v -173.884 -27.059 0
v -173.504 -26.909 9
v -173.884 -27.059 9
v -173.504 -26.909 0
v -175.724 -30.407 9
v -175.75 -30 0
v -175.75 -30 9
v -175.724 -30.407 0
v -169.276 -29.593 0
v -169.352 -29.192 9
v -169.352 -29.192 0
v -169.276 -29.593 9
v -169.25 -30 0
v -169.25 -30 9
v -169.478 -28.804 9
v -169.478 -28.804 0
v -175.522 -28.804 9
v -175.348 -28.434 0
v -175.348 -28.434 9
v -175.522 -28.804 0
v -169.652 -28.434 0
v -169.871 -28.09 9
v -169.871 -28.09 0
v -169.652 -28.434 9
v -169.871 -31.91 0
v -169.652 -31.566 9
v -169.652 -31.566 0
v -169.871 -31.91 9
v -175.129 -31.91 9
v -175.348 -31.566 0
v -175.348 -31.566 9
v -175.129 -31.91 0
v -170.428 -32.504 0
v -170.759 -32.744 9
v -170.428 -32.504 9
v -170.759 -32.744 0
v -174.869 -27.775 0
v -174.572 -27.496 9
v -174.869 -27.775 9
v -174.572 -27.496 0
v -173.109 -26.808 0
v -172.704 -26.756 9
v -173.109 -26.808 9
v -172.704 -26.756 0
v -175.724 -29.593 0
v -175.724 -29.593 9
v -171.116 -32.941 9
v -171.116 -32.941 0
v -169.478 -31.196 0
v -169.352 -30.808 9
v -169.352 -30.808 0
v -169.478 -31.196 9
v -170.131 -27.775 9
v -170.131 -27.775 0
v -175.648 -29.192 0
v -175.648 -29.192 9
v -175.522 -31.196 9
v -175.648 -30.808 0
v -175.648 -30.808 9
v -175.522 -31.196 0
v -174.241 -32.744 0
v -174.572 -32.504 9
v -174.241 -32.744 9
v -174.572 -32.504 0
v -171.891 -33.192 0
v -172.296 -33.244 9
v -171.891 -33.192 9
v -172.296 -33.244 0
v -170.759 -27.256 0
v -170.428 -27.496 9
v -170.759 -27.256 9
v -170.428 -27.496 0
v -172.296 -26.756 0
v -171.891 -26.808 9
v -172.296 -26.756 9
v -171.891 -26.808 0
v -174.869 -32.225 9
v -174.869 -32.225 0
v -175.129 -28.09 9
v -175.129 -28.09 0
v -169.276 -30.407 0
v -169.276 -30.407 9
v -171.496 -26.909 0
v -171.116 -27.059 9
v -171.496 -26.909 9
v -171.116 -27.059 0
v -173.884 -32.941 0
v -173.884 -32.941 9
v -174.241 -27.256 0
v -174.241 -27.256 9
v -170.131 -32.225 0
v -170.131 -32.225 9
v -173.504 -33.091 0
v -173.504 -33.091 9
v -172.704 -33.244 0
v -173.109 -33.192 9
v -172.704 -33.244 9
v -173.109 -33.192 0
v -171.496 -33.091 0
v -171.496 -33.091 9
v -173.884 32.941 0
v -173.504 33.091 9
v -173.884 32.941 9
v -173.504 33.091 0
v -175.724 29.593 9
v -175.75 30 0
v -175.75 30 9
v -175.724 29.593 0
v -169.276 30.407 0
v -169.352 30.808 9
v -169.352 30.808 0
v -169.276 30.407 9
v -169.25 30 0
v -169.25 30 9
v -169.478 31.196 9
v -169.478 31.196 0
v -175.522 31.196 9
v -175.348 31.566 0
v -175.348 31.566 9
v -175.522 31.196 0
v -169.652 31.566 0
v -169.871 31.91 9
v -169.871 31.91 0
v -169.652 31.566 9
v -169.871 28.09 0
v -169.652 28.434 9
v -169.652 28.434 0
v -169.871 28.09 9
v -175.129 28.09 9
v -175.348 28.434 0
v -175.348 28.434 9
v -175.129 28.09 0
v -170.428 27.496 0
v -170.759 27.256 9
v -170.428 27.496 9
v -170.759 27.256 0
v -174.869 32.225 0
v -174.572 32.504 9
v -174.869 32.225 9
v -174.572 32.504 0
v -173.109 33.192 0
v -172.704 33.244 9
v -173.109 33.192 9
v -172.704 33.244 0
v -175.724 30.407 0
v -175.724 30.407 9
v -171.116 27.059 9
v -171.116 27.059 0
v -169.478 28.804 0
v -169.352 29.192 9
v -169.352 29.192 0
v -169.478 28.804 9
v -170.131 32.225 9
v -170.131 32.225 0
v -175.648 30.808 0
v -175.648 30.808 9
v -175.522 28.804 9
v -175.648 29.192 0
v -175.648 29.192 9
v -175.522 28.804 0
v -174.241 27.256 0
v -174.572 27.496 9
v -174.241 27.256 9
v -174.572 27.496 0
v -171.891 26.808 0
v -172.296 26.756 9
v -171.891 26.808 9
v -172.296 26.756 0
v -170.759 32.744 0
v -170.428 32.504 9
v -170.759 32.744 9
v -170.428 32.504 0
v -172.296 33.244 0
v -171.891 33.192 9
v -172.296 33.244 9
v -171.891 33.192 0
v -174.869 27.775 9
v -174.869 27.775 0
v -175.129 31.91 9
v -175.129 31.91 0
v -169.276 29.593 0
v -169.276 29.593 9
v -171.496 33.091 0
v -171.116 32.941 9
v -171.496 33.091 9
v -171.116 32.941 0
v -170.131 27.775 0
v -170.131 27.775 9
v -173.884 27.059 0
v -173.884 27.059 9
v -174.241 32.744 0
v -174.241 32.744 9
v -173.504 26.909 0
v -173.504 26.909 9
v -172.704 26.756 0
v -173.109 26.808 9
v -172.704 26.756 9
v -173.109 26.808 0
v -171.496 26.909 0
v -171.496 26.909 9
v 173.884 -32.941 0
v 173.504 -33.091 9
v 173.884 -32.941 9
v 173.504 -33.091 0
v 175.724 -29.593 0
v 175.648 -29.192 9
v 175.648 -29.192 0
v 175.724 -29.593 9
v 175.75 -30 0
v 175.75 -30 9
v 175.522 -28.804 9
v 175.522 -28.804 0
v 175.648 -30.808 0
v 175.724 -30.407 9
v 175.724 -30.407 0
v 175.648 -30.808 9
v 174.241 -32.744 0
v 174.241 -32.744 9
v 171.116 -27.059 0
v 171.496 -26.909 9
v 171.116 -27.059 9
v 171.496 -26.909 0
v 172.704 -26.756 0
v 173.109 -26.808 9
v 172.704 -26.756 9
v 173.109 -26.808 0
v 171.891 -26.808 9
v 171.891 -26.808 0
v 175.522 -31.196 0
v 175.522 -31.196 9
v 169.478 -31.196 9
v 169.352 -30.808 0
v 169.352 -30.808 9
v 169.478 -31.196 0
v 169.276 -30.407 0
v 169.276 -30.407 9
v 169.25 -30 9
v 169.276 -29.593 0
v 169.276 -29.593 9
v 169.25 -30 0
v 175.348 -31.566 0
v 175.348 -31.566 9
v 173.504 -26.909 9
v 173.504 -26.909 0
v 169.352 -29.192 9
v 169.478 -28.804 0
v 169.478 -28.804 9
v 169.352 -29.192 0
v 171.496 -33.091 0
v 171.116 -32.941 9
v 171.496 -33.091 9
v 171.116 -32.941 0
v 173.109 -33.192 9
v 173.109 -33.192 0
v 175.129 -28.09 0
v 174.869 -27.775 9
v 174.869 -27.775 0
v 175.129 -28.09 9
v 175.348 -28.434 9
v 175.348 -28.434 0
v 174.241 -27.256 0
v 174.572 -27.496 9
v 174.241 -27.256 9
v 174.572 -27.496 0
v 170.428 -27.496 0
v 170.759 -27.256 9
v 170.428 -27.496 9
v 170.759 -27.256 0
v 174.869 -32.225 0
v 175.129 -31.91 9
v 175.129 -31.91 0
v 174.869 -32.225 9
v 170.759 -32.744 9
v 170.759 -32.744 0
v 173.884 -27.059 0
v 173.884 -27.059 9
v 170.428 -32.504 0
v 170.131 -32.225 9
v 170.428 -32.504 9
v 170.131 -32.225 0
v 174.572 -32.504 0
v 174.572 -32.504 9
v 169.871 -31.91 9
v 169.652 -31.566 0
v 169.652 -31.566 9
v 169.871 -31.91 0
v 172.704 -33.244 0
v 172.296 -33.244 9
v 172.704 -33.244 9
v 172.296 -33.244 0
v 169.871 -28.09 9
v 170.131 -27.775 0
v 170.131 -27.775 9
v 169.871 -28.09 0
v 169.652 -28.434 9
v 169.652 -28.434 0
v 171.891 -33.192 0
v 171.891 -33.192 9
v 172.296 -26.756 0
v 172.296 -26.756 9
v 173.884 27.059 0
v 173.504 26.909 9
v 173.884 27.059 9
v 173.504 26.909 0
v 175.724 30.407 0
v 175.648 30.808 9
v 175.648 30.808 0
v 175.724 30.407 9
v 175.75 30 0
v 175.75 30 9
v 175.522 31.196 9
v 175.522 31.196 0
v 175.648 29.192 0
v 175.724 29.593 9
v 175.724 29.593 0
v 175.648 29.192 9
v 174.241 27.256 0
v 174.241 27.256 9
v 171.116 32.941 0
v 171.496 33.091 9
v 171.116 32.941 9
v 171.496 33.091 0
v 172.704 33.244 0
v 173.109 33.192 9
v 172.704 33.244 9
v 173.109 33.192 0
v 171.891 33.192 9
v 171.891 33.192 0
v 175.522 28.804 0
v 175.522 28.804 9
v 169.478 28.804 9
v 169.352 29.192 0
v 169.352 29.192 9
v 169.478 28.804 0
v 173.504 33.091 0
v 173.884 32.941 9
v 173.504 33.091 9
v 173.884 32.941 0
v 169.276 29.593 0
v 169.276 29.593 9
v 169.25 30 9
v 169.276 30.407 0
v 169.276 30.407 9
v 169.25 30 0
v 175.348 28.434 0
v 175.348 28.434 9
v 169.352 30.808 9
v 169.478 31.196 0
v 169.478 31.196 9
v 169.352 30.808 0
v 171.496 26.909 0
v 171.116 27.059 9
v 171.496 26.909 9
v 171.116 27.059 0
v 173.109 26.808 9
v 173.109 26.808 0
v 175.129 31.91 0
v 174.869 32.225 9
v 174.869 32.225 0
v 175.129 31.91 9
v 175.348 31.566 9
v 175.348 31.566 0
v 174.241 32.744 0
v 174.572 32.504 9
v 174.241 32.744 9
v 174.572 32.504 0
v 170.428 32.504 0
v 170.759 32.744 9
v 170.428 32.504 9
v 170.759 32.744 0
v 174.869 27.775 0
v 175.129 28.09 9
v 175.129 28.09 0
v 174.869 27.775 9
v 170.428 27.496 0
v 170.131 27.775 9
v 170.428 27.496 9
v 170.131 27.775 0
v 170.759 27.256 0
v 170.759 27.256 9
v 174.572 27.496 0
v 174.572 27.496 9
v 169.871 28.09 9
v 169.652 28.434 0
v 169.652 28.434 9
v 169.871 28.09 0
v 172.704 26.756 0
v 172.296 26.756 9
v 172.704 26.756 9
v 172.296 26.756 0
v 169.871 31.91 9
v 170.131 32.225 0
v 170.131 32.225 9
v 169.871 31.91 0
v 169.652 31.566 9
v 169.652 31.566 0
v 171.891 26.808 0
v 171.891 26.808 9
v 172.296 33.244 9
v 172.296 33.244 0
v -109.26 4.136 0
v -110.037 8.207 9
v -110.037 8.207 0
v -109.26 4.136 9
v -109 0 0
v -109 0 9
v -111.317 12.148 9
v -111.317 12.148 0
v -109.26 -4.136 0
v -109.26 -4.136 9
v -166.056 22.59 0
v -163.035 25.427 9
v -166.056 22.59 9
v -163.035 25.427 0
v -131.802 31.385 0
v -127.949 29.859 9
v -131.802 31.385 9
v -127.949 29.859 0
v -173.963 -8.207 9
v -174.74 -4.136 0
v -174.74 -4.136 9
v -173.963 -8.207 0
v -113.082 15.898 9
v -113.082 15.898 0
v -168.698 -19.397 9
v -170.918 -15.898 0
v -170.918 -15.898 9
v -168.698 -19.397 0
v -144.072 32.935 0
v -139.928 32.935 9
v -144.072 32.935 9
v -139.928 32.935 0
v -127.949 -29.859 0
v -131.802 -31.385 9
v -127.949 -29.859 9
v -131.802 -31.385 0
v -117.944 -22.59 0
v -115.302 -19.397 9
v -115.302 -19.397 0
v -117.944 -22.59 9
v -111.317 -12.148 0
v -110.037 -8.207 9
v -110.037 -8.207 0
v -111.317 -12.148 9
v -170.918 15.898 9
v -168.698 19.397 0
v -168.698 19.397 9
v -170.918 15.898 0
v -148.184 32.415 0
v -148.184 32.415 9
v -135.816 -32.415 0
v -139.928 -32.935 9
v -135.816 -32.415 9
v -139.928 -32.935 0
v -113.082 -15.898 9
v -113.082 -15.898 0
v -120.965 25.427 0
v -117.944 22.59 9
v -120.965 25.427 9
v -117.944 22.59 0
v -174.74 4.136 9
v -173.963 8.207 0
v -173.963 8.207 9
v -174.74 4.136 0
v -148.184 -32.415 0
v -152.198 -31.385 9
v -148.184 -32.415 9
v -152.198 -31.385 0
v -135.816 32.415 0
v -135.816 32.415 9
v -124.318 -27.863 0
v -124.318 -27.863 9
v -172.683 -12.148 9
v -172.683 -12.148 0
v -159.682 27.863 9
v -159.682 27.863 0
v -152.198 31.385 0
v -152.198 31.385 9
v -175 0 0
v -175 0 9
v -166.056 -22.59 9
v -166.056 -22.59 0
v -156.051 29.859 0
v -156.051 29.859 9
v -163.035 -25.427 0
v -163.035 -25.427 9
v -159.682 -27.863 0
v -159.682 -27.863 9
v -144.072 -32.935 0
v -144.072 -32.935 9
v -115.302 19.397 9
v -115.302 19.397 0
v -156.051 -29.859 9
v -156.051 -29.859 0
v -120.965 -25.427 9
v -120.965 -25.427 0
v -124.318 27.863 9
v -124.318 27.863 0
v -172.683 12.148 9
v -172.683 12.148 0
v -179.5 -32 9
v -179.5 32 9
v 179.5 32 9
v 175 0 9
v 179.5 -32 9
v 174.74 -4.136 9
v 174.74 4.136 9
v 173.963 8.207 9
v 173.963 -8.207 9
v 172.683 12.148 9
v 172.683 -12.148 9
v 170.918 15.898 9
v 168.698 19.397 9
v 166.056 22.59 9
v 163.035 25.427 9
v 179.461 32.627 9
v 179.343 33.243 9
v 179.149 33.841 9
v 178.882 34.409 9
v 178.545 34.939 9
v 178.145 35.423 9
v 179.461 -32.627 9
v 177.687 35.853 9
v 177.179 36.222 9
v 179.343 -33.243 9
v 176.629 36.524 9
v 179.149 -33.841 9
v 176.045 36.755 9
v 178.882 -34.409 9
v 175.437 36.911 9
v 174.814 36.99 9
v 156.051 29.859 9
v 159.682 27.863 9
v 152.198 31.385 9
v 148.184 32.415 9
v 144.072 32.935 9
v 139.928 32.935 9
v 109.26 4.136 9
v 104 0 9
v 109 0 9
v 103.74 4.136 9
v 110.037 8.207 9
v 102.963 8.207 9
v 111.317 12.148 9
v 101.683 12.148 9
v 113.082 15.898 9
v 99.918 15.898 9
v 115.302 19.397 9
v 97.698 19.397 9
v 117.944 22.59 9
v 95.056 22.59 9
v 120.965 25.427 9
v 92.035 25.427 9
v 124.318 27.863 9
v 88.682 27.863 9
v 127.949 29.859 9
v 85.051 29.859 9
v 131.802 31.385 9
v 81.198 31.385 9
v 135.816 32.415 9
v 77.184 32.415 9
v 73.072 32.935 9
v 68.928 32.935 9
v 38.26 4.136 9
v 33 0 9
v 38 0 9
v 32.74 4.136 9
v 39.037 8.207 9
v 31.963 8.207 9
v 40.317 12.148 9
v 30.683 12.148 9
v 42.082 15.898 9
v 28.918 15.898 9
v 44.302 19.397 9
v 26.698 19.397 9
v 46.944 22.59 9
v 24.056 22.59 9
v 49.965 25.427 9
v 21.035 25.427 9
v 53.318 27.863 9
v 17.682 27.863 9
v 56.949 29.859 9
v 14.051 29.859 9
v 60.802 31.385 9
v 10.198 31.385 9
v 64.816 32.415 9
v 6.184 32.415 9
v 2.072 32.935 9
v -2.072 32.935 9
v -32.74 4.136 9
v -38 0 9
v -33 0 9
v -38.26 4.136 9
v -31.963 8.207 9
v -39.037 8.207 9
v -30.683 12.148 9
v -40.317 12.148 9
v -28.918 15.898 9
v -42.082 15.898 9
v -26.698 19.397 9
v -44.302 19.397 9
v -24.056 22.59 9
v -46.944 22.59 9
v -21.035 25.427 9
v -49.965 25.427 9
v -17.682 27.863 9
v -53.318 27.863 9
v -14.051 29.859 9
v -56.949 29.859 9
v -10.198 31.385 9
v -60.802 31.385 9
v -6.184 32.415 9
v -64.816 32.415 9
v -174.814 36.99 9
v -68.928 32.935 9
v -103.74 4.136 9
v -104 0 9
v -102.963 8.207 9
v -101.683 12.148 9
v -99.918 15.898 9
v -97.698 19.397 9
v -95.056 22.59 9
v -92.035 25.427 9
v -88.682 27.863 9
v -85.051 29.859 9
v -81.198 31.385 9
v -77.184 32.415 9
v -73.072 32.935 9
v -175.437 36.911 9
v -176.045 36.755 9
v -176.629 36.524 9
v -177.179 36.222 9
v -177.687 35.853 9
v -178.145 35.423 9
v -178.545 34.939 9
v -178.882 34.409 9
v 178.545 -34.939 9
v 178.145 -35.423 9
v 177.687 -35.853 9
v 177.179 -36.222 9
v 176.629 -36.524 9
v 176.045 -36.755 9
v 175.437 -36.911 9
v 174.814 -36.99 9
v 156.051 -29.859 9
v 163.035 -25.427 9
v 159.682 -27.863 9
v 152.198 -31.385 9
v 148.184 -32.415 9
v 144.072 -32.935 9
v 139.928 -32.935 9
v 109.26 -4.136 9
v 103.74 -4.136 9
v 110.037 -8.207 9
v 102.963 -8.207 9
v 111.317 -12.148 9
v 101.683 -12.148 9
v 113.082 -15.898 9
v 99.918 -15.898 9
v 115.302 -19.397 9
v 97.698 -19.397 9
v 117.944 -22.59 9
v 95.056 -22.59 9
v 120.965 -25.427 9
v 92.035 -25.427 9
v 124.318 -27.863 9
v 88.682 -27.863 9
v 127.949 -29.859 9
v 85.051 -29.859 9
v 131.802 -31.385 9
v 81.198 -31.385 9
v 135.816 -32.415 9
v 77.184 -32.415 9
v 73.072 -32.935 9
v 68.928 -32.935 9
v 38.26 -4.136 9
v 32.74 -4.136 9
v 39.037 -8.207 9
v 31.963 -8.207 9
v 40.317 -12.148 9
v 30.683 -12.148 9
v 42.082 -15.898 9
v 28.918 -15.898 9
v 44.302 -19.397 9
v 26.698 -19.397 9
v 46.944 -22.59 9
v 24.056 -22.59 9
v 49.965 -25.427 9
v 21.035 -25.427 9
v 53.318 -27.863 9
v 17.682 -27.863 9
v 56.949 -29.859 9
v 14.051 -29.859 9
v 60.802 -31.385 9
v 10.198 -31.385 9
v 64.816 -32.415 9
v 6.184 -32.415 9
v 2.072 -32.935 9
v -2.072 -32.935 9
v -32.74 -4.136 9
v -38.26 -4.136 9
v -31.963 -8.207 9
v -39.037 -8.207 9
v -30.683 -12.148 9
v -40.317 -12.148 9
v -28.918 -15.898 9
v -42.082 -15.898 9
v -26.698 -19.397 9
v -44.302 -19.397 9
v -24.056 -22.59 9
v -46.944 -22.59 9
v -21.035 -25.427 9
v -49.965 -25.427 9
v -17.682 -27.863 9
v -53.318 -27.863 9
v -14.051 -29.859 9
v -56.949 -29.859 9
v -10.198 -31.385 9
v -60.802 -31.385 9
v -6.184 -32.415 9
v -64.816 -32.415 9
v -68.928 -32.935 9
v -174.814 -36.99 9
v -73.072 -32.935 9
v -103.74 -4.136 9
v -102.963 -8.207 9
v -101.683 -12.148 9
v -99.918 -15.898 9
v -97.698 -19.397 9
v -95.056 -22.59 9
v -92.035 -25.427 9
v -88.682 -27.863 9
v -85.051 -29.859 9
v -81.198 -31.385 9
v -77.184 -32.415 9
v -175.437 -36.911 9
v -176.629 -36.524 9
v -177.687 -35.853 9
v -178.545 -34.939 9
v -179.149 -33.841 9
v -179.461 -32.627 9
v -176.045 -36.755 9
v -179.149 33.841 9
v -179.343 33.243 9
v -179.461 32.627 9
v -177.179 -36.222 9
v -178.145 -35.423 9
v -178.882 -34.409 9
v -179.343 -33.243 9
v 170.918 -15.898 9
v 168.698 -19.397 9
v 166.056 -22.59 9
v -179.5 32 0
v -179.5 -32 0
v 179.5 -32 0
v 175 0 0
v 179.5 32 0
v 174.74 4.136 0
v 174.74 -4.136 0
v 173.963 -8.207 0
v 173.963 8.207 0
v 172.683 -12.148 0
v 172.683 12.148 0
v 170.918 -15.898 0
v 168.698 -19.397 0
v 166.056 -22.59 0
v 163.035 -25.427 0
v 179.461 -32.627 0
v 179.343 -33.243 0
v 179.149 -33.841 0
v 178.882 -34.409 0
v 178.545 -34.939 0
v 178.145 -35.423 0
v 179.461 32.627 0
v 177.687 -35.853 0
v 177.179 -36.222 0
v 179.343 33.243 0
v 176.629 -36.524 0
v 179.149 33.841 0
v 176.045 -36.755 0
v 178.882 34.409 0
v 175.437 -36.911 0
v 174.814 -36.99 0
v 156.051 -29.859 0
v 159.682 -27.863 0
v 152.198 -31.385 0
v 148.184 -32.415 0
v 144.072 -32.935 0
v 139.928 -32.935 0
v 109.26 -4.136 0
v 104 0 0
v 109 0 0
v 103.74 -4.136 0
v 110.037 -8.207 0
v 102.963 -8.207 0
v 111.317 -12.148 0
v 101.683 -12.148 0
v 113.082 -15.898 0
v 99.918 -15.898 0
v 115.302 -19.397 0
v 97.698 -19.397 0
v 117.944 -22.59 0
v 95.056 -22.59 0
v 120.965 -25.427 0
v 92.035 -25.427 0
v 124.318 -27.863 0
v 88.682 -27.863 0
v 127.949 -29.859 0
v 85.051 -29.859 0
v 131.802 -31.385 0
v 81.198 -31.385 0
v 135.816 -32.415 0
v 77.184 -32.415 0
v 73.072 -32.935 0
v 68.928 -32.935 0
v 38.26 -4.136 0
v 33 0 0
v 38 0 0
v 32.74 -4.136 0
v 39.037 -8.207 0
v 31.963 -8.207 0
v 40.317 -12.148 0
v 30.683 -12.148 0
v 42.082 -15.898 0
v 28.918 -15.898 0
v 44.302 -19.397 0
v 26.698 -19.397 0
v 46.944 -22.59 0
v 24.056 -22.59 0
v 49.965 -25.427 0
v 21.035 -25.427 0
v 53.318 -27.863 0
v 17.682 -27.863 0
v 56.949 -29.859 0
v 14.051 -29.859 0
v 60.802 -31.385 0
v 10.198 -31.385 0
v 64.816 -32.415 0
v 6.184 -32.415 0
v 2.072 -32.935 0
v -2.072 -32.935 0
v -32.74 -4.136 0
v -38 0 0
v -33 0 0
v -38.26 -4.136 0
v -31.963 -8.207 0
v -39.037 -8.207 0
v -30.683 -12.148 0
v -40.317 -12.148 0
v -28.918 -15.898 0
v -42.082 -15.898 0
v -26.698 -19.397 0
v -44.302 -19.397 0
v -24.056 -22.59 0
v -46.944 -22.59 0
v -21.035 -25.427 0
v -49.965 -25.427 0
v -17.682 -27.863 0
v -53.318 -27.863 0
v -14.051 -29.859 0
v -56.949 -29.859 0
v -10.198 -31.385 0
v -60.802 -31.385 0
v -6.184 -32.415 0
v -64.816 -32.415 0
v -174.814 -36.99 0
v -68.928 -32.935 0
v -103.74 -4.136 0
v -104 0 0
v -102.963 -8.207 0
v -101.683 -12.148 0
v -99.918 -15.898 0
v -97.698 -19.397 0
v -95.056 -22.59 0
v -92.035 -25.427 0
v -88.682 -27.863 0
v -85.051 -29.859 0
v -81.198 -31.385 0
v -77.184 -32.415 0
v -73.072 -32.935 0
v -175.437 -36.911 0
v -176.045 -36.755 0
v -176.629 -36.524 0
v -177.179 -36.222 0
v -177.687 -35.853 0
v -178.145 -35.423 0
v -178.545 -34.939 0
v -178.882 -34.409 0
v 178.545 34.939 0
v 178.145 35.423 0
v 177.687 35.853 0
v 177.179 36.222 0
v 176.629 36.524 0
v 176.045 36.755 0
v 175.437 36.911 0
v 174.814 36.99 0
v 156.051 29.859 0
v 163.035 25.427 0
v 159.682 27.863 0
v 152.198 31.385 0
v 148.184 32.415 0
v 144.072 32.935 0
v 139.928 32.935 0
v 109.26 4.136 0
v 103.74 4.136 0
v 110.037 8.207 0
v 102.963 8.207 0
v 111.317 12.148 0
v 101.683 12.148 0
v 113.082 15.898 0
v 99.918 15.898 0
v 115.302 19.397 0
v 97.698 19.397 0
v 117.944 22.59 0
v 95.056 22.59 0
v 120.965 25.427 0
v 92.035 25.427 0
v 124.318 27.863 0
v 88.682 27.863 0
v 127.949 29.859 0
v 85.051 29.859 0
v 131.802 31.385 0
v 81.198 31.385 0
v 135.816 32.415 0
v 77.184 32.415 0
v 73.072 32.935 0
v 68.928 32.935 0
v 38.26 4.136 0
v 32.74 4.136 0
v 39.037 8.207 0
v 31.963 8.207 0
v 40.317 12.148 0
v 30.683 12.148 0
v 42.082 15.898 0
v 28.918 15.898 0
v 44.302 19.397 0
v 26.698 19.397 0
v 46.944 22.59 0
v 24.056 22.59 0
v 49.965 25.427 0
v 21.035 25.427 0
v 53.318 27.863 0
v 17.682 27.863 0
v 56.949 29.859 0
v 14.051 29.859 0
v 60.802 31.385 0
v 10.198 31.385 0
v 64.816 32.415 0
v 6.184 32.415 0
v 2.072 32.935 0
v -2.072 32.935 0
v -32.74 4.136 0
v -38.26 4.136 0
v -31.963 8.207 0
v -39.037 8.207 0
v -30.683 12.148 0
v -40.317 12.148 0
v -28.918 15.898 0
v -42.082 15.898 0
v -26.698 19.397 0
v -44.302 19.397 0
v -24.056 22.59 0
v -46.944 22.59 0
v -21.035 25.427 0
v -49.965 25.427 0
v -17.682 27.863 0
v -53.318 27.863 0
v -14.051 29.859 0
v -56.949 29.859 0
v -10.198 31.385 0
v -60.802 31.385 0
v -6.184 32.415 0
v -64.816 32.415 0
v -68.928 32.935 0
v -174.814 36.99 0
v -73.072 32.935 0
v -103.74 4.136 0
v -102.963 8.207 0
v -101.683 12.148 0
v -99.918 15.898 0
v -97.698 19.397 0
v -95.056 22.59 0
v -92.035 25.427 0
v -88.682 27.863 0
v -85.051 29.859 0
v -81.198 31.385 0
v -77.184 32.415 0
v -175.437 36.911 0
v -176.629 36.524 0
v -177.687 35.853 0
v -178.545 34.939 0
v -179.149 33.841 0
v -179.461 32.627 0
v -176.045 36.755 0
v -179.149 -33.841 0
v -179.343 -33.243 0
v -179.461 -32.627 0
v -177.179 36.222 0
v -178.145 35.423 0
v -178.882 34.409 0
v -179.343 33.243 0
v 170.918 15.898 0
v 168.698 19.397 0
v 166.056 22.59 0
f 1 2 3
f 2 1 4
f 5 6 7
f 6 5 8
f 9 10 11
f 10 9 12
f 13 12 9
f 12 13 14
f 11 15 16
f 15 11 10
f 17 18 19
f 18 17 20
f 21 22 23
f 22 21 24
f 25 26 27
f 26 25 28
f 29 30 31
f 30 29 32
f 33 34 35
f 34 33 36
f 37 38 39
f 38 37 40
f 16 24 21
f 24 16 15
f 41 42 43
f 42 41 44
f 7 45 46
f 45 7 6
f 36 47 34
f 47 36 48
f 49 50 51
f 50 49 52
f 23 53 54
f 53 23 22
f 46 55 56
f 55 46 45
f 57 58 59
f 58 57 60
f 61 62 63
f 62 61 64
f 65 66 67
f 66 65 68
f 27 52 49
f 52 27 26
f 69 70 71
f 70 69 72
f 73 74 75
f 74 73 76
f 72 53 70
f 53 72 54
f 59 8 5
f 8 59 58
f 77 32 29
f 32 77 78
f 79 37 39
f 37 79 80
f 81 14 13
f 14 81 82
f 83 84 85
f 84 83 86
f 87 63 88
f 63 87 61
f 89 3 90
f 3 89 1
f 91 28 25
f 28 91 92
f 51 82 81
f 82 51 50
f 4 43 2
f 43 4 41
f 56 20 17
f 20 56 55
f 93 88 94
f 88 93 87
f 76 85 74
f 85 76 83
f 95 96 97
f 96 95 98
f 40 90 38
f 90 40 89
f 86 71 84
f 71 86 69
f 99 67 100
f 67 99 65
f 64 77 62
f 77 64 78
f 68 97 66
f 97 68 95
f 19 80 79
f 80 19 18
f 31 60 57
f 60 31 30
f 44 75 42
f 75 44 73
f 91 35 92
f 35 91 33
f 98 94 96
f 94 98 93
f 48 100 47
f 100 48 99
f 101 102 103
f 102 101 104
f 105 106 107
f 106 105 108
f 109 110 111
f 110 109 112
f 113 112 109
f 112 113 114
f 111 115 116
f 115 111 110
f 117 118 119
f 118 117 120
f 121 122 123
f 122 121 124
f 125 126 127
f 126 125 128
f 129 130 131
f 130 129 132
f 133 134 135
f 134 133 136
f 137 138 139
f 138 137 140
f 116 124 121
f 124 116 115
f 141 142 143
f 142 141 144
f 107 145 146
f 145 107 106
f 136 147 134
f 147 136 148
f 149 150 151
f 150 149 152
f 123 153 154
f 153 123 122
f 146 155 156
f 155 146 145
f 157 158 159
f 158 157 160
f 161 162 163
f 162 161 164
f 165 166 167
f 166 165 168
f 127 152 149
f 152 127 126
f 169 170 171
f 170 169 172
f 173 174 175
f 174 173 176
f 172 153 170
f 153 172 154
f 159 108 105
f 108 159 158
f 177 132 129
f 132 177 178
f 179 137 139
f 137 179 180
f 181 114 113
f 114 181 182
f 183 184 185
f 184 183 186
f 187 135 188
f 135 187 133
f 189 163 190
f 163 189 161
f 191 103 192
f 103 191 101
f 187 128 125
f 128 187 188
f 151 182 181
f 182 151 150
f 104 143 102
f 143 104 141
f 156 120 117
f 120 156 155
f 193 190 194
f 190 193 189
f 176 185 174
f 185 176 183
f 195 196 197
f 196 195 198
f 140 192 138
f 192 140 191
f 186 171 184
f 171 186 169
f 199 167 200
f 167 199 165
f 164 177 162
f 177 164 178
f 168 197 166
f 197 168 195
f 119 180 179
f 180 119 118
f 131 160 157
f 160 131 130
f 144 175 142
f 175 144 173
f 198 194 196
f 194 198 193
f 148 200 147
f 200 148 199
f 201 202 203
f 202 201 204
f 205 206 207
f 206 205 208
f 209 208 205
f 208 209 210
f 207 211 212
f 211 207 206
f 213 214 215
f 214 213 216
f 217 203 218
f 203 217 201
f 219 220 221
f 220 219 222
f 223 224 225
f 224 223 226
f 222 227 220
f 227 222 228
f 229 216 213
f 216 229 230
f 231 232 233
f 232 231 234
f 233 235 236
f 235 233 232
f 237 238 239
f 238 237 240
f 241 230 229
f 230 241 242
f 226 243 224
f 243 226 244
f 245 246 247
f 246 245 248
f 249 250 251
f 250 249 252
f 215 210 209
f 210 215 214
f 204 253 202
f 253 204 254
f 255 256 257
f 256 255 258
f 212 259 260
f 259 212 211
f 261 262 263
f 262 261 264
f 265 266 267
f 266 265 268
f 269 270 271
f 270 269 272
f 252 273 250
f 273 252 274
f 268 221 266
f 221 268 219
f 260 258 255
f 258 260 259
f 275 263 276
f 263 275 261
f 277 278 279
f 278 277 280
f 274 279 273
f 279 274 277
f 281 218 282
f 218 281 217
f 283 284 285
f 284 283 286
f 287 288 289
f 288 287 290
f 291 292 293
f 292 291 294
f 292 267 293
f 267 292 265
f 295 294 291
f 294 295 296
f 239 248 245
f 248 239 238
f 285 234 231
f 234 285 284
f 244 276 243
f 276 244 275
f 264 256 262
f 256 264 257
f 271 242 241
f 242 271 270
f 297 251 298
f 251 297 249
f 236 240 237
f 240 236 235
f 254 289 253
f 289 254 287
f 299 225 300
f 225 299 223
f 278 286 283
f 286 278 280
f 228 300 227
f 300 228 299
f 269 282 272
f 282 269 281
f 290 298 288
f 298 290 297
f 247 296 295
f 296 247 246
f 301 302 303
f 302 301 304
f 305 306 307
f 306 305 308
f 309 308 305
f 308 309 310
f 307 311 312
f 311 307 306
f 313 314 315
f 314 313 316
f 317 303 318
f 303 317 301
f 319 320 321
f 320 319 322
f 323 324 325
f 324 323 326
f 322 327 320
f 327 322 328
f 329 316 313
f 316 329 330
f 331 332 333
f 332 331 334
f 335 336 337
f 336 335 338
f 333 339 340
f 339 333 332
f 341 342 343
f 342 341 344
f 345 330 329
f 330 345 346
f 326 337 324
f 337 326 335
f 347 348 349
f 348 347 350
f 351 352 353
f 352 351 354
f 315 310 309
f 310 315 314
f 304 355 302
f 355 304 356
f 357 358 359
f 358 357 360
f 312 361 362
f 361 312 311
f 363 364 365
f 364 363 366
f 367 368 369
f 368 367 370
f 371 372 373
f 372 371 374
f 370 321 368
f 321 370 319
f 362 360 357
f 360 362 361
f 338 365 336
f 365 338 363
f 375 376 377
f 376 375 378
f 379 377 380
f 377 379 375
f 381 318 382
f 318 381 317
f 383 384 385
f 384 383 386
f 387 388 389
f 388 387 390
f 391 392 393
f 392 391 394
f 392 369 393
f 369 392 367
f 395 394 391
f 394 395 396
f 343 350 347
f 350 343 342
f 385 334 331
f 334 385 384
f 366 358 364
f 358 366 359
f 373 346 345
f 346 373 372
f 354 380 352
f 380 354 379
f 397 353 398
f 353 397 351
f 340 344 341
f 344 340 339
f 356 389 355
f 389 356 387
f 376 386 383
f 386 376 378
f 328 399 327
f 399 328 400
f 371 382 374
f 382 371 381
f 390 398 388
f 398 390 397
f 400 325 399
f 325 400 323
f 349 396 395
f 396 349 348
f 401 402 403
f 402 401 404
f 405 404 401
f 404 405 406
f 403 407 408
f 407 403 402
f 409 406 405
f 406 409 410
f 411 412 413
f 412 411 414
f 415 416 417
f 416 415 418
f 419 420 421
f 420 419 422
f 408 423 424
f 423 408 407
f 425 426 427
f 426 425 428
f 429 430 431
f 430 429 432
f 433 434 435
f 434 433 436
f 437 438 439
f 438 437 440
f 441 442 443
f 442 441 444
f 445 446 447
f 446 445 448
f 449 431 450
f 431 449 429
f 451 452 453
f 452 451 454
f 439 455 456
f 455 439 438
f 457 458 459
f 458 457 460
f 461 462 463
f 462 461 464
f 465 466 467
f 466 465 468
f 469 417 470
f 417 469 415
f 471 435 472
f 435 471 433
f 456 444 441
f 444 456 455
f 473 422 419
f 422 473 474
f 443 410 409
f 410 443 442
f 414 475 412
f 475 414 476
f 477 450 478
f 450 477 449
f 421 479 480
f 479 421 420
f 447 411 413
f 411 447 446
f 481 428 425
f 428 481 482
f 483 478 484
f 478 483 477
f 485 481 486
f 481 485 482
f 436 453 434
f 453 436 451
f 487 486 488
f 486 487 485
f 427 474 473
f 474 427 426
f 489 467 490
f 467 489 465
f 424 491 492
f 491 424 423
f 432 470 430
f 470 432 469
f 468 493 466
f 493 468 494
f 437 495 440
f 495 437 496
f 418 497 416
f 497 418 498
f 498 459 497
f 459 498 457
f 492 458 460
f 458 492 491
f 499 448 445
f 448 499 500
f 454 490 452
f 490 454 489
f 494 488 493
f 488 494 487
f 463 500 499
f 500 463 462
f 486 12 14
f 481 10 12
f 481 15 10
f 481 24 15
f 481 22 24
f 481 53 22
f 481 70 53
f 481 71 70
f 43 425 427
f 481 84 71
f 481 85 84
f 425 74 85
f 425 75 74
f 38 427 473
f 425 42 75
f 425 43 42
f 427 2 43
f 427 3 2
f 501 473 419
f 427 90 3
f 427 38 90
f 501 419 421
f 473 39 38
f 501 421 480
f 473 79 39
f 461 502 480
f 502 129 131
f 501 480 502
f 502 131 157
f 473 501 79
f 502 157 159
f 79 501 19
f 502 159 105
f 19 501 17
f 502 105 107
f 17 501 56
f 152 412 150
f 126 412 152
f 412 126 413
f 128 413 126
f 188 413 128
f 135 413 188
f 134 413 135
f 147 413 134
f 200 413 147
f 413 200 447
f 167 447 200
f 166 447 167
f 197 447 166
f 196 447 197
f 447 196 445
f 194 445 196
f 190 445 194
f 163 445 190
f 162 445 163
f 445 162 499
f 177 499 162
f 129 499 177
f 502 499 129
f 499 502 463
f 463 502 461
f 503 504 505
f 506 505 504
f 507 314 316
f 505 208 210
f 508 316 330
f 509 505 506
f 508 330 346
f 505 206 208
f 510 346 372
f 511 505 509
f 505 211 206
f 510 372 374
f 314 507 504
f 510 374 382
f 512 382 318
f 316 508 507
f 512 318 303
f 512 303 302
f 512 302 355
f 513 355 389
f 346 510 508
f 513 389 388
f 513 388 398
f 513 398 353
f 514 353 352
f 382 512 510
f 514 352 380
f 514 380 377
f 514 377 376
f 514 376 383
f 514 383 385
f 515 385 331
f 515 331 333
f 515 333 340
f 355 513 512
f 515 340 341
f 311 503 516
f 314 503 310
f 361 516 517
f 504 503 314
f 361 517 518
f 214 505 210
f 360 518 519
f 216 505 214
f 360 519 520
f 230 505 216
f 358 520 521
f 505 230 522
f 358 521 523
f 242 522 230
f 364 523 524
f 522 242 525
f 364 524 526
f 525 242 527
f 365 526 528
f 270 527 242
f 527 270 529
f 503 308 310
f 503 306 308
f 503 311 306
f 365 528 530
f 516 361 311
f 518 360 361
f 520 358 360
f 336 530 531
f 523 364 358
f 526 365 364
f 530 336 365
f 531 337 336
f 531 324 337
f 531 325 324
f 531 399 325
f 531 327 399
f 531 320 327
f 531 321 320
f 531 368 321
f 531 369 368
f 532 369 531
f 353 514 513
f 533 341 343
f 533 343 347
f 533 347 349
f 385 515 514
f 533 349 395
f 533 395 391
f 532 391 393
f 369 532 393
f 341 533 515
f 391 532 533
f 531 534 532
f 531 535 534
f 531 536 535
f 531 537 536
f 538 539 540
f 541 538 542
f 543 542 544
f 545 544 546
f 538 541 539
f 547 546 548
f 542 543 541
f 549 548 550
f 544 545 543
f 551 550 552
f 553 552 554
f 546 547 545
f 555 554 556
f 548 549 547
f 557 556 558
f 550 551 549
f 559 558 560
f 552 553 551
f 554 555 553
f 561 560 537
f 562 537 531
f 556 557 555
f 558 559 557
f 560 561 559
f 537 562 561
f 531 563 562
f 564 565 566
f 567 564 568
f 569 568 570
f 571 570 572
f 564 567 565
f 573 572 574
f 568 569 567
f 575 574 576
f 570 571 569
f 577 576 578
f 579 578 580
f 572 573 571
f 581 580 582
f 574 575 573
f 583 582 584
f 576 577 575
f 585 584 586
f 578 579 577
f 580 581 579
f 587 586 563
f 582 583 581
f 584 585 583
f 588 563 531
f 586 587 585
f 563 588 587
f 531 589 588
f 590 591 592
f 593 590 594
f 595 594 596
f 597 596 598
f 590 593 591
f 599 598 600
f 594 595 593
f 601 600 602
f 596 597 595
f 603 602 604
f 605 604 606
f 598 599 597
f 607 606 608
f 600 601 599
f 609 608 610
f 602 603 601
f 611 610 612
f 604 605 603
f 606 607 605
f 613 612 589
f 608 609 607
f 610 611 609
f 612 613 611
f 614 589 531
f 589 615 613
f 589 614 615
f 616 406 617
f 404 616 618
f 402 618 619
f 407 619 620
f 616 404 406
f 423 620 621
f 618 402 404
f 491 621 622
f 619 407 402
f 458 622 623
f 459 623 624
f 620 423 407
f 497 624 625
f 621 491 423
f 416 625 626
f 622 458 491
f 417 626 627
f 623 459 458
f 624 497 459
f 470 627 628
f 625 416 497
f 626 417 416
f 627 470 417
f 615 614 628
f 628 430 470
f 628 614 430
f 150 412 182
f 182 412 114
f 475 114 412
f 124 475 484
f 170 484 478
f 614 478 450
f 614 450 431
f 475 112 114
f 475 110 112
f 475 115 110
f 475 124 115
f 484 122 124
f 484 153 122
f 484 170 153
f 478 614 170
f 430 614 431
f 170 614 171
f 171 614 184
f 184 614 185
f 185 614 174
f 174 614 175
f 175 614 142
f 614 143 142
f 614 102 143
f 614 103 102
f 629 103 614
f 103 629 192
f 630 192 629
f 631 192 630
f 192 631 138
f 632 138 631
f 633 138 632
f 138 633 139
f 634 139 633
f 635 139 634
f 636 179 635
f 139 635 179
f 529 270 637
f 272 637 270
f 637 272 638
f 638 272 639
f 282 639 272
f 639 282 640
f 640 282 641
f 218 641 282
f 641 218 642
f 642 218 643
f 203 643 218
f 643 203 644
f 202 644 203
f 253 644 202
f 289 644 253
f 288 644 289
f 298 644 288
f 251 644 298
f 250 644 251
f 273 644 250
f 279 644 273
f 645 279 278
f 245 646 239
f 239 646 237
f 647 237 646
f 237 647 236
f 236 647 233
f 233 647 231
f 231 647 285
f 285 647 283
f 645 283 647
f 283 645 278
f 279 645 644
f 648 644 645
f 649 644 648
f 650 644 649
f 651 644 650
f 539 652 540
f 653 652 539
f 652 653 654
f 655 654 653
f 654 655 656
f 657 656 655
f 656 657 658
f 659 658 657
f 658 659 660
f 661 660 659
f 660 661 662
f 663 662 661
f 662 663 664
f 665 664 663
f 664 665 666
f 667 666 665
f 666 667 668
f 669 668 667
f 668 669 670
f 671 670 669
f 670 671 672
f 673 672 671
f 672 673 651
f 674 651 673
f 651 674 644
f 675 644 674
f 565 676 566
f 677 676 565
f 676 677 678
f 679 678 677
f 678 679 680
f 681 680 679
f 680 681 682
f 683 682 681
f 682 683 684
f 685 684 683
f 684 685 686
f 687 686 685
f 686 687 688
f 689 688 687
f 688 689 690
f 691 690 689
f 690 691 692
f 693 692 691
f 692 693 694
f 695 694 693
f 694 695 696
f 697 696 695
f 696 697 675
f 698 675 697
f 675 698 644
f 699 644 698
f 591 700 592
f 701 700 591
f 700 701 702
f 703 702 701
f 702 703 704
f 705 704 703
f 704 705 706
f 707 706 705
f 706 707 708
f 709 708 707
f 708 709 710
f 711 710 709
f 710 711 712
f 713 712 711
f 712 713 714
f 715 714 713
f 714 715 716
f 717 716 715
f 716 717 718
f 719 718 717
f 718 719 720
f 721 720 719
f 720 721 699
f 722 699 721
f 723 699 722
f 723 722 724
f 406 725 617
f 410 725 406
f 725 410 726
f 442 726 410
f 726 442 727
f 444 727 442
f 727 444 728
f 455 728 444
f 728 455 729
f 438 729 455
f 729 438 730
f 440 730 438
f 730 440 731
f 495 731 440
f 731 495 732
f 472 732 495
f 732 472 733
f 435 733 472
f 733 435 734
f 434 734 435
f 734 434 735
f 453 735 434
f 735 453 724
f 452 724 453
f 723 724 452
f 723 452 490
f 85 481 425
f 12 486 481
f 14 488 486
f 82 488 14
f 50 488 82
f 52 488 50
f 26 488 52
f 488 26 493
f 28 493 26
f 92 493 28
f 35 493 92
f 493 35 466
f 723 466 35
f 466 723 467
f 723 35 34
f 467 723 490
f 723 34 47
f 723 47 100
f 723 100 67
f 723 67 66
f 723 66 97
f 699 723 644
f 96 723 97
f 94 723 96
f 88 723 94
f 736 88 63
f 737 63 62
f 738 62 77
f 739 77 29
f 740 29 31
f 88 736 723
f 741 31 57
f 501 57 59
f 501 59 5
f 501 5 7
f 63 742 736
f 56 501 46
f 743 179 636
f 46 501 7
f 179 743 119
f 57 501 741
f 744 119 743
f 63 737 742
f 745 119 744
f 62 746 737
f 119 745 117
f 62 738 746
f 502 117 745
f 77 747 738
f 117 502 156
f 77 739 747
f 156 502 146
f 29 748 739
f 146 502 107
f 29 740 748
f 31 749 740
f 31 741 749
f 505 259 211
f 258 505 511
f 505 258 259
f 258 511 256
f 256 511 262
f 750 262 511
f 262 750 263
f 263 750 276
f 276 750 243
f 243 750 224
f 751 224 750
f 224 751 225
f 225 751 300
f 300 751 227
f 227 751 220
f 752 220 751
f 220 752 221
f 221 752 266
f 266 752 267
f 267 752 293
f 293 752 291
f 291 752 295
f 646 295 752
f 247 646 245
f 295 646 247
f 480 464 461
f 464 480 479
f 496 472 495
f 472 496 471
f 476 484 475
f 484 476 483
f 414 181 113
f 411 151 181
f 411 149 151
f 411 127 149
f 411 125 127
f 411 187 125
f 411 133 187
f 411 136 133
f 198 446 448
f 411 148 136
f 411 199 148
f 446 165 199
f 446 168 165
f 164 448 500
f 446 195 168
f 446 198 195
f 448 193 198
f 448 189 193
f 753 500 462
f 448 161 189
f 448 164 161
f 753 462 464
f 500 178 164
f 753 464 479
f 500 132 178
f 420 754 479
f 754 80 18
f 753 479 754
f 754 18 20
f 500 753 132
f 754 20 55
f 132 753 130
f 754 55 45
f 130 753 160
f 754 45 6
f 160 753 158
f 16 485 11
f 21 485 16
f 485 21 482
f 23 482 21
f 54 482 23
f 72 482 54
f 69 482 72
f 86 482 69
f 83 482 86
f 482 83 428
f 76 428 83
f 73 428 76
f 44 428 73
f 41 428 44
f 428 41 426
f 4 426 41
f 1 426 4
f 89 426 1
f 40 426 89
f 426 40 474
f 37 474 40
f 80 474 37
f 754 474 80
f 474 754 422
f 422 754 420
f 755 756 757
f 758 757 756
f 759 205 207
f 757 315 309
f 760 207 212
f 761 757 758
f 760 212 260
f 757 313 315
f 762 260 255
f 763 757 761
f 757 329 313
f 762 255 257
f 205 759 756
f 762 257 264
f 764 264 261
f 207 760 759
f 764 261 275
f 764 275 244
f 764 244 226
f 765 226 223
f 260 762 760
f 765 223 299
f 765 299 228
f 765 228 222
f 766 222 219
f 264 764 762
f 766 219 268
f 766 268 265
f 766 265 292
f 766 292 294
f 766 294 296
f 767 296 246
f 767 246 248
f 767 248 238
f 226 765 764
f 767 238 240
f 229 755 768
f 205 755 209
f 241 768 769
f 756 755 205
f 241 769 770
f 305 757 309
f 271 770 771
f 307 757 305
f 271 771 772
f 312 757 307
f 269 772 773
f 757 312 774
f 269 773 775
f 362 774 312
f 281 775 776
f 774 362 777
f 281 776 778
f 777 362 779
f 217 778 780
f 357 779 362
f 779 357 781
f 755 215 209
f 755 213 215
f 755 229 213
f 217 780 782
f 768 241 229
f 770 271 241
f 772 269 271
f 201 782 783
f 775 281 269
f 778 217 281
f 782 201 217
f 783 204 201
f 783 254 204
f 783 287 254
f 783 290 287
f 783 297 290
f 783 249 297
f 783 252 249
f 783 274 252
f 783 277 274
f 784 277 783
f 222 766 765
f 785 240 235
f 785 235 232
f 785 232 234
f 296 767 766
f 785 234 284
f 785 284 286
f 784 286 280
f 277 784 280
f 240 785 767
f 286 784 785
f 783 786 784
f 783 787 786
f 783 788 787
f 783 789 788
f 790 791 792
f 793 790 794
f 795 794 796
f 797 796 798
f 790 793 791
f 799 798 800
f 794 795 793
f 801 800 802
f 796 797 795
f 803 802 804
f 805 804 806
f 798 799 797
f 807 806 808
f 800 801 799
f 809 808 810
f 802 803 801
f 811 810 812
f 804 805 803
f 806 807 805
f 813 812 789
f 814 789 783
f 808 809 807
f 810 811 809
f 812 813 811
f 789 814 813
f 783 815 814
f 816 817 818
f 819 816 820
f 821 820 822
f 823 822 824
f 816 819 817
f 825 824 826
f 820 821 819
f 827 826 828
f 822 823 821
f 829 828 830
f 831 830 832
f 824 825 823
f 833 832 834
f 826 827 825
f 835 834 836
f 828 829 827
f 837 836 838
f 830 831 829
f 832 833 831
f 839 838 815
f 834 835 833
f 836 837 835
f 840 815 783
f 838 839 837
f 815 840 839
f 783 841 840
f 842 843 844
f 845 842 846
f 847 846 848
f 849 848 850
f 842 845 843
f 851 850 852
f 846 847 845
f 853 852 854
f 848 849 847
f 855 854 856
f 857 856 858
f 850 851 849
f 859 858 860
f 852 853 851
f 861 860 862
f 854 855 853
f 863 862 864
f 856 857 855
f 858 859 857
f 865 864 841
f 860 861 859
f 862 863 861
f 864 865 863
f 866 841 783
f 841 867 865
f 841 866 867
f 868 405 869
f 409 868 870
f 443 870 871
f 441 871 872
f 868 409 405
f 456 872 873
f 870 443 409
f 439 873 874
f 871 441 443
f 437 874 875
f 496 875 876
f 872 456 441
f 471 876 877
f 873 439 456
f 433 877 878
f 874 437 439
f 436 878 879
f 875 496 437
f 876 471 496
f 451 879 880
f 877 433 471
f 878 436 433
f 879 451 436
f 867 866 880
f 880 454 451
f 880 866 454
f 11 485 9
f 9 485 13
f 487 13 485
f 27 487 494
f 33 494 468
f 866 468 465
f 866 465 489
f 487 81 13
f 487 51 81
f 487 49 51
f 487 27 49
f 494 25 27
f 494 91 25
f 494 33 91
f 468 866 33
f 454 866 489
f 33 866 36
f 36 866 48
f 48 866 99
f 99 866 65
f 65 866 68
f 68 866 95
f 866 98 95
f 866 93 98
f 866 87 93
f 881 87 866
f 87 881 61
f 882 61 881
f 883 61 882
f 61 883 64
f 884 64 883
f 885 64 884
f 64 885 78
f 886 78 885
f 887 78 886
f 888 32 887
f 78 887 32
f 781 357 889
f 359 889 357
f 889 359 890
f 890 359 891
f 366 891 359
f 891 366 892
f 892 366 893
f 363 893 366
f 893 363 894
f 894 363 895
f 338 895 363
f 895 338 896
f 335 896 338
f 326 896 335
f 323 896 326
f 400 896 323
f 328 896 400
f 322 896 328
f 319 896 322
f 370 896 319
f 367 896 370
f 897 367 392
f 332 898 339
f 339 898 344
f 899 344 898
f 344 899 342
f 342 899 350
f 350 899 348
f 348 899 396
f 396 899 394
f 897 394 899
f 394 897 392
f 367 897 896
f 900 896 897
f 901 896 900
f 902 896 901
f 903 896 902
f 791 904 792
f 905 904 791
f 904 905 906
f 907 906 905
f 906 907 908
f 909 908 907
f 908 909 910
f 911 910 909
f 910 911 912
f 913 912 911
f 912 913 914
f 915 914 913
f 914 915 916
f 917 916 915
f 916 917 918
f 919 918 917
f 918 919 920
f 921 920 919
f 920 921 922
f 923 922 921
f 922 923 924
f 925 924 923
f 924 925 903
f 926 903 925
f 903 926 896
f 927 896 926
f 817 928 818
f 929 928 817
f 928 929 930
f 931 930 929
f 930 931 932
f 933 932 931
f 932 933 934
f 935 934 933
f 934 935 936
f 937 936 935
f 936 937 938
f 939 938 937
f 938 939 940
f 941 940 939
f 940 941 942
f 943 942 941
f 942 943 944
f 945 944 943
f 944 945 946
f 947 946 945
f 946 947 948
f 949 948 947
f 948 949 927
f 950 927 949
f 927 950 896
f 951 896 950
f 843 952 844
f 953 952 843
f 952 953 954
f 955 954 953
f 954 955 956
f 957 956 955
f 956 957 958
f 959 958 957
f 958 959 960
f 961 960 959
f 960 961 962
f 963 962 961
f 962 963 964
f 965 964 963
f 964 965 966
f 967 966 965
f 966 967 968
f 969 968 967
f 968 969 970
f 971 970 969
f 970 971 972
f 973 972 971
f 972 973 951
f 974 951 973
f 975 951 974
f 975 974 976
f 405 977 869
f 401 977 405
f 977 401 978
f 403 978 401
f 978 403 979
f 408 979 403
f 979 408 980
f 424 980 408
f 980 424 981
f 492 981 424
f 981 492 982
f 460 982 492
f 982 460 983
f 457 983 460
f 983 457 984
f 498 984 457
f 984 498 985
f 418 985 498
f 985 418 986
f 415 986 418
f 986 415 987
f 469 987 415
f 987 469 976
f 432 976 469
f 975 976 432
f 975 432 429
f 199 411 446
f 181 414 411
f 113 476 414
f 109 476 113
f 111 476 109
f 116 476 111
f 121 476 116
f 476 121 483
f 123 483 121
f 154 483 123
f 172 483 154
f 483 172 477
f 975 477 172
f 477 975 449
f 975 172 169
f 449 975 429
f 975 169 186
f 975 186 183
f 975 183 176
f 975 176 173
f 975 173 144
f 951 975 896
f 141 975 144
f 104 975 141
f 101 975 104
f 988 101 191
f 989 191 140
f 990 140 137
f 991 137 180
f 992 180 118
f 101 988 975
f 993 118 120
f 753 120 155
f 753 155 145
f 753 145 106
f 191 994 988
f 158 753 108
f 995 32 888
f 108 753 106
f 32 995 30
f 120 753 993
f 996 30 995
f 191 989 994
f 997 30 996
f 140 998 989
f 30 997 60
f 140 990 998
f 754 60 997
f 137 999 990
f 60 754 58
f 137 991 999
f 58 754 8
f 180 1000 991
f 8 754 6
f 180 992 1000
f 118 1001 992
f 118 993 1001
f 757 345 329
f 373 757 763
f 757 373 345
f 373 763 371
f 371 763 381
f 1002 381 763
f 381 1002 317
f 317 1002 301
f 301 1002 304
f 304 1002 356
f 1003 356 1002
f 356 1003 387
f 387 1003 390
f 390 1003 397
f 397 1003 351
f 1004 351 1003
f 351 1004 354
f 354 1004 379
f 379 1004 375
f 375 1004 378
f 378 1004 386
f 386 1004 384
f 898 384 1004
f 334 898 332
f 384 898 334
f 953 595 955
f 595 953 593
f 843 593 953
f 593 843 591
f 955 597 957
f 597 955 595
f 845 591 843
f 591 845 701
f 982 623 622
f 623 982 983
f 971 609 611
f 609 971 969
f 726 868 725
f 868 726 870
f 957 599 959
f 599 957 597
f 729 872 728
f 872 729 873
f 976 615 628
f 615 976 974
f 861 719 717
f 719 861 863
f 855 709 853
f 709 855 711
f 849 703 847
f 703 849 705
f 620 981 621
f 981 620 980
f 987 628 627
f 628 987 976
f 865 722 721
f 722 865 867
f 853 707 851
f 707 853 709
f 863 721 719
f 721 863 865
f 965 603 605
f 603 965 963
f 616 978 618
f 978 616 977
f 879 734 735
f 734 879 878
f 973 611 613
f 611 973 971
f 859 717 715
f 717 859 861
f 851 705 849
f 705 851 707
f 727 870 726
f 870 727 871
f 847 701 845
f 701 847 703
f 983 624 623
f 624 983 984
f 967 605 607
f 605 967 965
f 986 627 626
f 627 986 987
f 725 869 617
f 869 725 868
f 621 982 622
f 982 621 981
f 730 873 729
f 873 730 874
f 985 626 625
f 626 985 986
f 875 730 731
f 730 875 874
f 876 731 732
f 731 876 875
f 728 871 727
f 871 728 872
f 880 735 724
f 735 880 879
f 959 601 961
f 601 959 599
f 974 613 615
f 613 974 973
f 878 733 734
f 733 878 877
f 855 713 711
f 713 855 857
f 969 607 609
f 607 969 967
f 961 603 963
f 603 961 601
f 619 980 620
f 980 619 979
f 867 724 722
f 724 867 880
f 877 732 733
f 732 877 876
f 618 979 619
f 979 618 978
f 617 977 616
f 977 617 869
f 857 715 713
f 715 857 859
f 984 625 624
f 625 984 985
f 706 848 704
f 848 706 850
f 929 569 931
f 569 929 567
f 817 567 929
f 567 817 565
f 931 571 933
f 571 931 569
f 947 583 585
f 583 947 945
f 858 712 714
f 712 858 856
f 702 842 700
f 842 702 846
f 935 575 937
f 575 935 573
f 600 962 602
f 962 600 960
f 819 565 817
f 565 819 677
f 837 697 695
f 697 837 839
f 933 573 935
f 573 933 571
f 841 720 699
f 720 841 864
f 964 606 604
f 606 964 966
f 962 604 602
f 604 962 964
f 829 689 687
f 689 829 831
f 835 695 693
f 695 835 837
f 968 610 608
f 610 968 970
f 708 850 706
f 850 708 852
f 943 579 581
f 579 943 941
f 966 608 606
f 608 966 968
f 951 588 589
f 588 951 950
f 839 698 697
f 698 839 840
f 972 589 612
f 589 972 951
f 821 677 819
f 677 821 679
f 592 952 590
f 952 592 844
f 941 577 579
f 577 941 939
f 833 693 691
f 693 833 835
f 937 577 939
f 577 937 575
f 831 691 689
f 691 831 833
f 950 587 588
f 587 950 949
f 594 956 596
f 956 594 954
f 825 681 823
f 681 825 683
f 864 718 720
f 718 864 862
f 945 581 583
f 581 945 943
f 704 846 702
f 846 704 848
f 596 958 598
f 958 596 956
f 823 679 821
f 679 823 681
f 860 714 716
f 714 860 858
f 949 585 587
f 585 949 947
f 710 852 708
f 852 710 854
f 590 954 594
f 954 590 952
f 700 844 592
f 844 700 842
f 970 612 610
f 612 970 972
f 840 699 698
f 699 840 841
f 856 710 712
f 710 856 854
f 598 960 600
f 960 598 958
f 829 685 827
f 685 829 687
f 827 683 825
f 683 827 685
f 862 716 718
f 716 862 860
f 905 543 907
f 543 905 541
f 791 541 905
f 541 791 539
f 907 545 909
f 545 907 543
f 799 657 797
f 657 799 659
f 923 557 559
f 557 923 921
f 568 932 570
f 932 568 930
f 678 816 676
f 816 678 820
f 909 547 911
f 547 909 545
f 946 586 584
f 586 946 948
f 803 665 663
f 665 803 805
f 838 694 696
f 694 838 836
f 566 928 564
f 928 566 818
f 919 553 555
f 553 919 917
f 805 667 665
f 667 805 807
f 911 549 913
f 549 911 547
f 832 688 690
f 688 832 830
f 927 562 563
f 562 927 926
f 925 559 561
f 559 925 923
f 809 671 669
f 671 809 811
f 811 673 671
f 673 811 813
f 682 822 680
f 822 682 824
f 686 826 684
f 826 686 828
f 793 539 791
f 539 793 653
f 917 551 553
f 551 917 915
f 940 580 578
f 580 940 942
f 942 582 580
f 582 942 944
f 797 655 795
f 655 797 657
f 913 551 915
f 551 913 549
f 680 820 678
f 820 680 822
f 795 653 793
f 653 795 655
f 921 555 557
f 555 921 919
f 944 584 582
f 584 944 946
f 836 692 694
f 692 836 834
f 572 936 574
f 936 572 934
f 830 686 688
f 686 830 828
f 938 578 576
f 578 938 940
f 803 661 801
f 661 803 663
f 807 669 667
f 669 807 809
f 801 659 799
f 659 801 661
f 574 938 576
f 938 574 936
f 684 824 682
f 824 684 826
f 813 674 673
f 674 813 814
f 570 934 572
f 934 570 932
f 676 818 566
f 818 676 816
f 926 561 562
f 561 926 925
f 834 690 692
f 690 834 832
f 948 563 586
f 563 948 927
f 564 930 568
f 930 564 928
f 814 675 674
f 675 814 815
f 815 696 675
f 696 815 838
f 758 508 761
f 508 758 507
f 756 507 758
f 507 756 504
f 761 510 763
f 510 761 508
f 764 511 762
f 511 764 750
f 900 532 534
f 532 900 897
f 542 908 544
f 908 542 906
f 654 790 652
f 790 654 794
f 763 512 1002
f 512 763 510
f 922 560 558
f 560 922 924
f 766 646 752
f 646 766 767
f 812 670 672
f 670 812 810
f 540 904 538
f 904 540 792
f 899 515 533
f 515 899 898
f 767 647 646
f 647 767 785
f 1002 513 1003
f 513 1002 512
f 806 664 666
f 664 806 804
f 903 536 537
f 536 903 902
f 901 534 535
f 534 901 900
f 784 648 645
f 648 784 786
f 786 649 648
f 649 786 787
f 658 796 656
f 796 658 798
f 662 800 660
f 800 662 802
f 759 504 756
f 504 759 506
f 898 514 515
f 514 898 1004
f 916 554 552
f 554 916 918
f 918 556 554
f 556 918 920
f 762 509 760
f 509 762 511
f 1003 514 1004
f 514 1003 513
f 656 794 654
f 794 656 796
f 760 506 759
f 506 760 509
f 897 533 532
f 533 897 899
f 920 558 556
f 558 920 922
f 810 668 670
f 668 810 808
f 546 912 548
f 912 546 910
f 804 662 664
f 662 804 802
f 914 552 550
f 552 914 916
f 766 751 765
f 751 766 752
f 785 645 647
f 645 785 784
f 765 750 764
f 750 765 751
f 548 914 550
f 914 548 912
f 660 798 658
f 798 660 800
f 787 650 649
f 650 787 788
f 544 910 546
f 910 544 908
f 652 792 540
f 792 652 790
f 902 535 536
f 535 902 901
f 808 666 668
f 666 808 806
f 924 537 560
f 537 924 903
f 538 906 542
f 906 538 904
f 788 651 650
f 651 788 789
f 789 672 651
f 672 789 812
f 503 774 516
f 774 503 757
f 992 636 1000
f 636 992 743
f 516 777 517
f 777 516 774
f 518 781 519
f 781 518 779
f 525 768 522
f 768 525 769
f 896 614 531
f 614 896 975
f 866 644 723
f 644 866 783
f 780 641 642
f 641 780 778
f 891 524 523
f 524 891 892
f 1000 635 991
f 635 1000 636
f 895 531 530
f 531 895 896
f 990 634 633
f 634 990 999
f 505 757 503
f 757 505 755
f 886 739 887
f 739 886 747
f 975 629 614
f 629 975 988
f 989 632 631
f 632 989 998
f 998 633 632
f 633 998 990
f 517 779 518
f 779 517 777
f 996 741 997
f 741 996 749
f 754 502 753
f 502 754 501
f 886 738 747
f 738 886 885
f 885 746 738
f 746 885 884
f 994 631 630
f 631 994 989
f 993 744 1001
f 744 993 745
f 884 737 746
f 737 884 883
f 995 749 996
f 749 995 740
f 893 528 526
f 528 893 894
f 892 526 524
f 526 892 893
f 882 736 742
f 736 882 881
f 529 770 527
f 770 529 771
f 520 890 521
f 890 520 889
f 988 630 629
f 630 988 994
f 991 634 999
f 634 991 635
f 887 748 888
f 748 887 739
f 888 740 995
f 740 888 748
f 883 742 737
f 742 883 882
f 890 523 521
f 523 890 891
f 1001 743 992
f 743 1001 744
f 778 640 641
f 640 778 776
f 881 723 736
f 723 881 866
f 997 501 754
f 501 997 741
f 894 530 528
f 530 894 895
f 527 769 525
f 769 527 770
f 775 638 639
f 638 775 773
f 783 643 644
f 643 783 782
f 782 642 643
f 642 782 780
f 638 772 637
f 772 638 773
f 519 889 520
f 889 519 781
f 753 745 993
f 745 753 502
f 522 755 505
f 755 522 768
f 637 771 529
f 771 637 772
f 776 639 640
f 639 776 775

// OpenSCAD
$fn = 50;

difference() {
	union() {
		hull() {
			translate(v = [-174.5, 32.0, 0]) {
				cylinder(h = 9, r = 5);
			}
			translate(v = [174.5, 32.0, 0]) {
				cylinder(h = 9, r = 5);
			}
			translate(v = [-174.5, -32.0, 0]) {
				cylinder(h = 9, r = 5);
			}
			translate(v = [174.5, -32.0, 0]) {
				cylinder(h = 9, r = 5);
			}
		}
	}
	union() {
		translate(v = [-172.5, -30.0, -100.0]) {
			cylinder(h = 200, r = 3.25);
		}
		translate(v = [-172.5, 30.0, -100.0]) {
			cylinder(h = 200, r = 3.25);
		}
		translate(v = [172.5, -30.0, -100.0]) {
			cylinder(h = 200, r = 3.25);
		}
		translate(v = [172.5, 30.0, -100.0]) {
			cylinder(h = 200, r = 3.25);
		}
		translate(v = [-172.5, -30.0, -100.0]) {
			cylinder(h = 200, r = 1.8);
		}
		translate(v = [-172.5, 30.0, -100.0]) {
			cylinder(h = 200, r = 1.8);
		}
		translate(v = [172.5, -30.0, -100.0]) {
			cylinder(h = 200, r = 1.8);
		}
		translate(v = [172.5, 30.0, -100.0]) {
			cylinder(h = 200, r = 1.8);
		}
		translate(v = [-142.0, 0, 0.0]) {
			cylinder(h = 9, r = 33.0);
		}
		translate(v = [-71.0, 0, 0.0]) {
			cylinder(h = 9, r = 33.0);
		}
		cylinder(h = 9, r = 33.0);
		translate(v = [71.0, 0, 0.0]) {
			cylinder(h = 9, r = 33.0);
		}
		translate(v = [142.0, 0, 0.0]) {
			cylinder(h = 9, r = 33.0);
		}
	}
}
